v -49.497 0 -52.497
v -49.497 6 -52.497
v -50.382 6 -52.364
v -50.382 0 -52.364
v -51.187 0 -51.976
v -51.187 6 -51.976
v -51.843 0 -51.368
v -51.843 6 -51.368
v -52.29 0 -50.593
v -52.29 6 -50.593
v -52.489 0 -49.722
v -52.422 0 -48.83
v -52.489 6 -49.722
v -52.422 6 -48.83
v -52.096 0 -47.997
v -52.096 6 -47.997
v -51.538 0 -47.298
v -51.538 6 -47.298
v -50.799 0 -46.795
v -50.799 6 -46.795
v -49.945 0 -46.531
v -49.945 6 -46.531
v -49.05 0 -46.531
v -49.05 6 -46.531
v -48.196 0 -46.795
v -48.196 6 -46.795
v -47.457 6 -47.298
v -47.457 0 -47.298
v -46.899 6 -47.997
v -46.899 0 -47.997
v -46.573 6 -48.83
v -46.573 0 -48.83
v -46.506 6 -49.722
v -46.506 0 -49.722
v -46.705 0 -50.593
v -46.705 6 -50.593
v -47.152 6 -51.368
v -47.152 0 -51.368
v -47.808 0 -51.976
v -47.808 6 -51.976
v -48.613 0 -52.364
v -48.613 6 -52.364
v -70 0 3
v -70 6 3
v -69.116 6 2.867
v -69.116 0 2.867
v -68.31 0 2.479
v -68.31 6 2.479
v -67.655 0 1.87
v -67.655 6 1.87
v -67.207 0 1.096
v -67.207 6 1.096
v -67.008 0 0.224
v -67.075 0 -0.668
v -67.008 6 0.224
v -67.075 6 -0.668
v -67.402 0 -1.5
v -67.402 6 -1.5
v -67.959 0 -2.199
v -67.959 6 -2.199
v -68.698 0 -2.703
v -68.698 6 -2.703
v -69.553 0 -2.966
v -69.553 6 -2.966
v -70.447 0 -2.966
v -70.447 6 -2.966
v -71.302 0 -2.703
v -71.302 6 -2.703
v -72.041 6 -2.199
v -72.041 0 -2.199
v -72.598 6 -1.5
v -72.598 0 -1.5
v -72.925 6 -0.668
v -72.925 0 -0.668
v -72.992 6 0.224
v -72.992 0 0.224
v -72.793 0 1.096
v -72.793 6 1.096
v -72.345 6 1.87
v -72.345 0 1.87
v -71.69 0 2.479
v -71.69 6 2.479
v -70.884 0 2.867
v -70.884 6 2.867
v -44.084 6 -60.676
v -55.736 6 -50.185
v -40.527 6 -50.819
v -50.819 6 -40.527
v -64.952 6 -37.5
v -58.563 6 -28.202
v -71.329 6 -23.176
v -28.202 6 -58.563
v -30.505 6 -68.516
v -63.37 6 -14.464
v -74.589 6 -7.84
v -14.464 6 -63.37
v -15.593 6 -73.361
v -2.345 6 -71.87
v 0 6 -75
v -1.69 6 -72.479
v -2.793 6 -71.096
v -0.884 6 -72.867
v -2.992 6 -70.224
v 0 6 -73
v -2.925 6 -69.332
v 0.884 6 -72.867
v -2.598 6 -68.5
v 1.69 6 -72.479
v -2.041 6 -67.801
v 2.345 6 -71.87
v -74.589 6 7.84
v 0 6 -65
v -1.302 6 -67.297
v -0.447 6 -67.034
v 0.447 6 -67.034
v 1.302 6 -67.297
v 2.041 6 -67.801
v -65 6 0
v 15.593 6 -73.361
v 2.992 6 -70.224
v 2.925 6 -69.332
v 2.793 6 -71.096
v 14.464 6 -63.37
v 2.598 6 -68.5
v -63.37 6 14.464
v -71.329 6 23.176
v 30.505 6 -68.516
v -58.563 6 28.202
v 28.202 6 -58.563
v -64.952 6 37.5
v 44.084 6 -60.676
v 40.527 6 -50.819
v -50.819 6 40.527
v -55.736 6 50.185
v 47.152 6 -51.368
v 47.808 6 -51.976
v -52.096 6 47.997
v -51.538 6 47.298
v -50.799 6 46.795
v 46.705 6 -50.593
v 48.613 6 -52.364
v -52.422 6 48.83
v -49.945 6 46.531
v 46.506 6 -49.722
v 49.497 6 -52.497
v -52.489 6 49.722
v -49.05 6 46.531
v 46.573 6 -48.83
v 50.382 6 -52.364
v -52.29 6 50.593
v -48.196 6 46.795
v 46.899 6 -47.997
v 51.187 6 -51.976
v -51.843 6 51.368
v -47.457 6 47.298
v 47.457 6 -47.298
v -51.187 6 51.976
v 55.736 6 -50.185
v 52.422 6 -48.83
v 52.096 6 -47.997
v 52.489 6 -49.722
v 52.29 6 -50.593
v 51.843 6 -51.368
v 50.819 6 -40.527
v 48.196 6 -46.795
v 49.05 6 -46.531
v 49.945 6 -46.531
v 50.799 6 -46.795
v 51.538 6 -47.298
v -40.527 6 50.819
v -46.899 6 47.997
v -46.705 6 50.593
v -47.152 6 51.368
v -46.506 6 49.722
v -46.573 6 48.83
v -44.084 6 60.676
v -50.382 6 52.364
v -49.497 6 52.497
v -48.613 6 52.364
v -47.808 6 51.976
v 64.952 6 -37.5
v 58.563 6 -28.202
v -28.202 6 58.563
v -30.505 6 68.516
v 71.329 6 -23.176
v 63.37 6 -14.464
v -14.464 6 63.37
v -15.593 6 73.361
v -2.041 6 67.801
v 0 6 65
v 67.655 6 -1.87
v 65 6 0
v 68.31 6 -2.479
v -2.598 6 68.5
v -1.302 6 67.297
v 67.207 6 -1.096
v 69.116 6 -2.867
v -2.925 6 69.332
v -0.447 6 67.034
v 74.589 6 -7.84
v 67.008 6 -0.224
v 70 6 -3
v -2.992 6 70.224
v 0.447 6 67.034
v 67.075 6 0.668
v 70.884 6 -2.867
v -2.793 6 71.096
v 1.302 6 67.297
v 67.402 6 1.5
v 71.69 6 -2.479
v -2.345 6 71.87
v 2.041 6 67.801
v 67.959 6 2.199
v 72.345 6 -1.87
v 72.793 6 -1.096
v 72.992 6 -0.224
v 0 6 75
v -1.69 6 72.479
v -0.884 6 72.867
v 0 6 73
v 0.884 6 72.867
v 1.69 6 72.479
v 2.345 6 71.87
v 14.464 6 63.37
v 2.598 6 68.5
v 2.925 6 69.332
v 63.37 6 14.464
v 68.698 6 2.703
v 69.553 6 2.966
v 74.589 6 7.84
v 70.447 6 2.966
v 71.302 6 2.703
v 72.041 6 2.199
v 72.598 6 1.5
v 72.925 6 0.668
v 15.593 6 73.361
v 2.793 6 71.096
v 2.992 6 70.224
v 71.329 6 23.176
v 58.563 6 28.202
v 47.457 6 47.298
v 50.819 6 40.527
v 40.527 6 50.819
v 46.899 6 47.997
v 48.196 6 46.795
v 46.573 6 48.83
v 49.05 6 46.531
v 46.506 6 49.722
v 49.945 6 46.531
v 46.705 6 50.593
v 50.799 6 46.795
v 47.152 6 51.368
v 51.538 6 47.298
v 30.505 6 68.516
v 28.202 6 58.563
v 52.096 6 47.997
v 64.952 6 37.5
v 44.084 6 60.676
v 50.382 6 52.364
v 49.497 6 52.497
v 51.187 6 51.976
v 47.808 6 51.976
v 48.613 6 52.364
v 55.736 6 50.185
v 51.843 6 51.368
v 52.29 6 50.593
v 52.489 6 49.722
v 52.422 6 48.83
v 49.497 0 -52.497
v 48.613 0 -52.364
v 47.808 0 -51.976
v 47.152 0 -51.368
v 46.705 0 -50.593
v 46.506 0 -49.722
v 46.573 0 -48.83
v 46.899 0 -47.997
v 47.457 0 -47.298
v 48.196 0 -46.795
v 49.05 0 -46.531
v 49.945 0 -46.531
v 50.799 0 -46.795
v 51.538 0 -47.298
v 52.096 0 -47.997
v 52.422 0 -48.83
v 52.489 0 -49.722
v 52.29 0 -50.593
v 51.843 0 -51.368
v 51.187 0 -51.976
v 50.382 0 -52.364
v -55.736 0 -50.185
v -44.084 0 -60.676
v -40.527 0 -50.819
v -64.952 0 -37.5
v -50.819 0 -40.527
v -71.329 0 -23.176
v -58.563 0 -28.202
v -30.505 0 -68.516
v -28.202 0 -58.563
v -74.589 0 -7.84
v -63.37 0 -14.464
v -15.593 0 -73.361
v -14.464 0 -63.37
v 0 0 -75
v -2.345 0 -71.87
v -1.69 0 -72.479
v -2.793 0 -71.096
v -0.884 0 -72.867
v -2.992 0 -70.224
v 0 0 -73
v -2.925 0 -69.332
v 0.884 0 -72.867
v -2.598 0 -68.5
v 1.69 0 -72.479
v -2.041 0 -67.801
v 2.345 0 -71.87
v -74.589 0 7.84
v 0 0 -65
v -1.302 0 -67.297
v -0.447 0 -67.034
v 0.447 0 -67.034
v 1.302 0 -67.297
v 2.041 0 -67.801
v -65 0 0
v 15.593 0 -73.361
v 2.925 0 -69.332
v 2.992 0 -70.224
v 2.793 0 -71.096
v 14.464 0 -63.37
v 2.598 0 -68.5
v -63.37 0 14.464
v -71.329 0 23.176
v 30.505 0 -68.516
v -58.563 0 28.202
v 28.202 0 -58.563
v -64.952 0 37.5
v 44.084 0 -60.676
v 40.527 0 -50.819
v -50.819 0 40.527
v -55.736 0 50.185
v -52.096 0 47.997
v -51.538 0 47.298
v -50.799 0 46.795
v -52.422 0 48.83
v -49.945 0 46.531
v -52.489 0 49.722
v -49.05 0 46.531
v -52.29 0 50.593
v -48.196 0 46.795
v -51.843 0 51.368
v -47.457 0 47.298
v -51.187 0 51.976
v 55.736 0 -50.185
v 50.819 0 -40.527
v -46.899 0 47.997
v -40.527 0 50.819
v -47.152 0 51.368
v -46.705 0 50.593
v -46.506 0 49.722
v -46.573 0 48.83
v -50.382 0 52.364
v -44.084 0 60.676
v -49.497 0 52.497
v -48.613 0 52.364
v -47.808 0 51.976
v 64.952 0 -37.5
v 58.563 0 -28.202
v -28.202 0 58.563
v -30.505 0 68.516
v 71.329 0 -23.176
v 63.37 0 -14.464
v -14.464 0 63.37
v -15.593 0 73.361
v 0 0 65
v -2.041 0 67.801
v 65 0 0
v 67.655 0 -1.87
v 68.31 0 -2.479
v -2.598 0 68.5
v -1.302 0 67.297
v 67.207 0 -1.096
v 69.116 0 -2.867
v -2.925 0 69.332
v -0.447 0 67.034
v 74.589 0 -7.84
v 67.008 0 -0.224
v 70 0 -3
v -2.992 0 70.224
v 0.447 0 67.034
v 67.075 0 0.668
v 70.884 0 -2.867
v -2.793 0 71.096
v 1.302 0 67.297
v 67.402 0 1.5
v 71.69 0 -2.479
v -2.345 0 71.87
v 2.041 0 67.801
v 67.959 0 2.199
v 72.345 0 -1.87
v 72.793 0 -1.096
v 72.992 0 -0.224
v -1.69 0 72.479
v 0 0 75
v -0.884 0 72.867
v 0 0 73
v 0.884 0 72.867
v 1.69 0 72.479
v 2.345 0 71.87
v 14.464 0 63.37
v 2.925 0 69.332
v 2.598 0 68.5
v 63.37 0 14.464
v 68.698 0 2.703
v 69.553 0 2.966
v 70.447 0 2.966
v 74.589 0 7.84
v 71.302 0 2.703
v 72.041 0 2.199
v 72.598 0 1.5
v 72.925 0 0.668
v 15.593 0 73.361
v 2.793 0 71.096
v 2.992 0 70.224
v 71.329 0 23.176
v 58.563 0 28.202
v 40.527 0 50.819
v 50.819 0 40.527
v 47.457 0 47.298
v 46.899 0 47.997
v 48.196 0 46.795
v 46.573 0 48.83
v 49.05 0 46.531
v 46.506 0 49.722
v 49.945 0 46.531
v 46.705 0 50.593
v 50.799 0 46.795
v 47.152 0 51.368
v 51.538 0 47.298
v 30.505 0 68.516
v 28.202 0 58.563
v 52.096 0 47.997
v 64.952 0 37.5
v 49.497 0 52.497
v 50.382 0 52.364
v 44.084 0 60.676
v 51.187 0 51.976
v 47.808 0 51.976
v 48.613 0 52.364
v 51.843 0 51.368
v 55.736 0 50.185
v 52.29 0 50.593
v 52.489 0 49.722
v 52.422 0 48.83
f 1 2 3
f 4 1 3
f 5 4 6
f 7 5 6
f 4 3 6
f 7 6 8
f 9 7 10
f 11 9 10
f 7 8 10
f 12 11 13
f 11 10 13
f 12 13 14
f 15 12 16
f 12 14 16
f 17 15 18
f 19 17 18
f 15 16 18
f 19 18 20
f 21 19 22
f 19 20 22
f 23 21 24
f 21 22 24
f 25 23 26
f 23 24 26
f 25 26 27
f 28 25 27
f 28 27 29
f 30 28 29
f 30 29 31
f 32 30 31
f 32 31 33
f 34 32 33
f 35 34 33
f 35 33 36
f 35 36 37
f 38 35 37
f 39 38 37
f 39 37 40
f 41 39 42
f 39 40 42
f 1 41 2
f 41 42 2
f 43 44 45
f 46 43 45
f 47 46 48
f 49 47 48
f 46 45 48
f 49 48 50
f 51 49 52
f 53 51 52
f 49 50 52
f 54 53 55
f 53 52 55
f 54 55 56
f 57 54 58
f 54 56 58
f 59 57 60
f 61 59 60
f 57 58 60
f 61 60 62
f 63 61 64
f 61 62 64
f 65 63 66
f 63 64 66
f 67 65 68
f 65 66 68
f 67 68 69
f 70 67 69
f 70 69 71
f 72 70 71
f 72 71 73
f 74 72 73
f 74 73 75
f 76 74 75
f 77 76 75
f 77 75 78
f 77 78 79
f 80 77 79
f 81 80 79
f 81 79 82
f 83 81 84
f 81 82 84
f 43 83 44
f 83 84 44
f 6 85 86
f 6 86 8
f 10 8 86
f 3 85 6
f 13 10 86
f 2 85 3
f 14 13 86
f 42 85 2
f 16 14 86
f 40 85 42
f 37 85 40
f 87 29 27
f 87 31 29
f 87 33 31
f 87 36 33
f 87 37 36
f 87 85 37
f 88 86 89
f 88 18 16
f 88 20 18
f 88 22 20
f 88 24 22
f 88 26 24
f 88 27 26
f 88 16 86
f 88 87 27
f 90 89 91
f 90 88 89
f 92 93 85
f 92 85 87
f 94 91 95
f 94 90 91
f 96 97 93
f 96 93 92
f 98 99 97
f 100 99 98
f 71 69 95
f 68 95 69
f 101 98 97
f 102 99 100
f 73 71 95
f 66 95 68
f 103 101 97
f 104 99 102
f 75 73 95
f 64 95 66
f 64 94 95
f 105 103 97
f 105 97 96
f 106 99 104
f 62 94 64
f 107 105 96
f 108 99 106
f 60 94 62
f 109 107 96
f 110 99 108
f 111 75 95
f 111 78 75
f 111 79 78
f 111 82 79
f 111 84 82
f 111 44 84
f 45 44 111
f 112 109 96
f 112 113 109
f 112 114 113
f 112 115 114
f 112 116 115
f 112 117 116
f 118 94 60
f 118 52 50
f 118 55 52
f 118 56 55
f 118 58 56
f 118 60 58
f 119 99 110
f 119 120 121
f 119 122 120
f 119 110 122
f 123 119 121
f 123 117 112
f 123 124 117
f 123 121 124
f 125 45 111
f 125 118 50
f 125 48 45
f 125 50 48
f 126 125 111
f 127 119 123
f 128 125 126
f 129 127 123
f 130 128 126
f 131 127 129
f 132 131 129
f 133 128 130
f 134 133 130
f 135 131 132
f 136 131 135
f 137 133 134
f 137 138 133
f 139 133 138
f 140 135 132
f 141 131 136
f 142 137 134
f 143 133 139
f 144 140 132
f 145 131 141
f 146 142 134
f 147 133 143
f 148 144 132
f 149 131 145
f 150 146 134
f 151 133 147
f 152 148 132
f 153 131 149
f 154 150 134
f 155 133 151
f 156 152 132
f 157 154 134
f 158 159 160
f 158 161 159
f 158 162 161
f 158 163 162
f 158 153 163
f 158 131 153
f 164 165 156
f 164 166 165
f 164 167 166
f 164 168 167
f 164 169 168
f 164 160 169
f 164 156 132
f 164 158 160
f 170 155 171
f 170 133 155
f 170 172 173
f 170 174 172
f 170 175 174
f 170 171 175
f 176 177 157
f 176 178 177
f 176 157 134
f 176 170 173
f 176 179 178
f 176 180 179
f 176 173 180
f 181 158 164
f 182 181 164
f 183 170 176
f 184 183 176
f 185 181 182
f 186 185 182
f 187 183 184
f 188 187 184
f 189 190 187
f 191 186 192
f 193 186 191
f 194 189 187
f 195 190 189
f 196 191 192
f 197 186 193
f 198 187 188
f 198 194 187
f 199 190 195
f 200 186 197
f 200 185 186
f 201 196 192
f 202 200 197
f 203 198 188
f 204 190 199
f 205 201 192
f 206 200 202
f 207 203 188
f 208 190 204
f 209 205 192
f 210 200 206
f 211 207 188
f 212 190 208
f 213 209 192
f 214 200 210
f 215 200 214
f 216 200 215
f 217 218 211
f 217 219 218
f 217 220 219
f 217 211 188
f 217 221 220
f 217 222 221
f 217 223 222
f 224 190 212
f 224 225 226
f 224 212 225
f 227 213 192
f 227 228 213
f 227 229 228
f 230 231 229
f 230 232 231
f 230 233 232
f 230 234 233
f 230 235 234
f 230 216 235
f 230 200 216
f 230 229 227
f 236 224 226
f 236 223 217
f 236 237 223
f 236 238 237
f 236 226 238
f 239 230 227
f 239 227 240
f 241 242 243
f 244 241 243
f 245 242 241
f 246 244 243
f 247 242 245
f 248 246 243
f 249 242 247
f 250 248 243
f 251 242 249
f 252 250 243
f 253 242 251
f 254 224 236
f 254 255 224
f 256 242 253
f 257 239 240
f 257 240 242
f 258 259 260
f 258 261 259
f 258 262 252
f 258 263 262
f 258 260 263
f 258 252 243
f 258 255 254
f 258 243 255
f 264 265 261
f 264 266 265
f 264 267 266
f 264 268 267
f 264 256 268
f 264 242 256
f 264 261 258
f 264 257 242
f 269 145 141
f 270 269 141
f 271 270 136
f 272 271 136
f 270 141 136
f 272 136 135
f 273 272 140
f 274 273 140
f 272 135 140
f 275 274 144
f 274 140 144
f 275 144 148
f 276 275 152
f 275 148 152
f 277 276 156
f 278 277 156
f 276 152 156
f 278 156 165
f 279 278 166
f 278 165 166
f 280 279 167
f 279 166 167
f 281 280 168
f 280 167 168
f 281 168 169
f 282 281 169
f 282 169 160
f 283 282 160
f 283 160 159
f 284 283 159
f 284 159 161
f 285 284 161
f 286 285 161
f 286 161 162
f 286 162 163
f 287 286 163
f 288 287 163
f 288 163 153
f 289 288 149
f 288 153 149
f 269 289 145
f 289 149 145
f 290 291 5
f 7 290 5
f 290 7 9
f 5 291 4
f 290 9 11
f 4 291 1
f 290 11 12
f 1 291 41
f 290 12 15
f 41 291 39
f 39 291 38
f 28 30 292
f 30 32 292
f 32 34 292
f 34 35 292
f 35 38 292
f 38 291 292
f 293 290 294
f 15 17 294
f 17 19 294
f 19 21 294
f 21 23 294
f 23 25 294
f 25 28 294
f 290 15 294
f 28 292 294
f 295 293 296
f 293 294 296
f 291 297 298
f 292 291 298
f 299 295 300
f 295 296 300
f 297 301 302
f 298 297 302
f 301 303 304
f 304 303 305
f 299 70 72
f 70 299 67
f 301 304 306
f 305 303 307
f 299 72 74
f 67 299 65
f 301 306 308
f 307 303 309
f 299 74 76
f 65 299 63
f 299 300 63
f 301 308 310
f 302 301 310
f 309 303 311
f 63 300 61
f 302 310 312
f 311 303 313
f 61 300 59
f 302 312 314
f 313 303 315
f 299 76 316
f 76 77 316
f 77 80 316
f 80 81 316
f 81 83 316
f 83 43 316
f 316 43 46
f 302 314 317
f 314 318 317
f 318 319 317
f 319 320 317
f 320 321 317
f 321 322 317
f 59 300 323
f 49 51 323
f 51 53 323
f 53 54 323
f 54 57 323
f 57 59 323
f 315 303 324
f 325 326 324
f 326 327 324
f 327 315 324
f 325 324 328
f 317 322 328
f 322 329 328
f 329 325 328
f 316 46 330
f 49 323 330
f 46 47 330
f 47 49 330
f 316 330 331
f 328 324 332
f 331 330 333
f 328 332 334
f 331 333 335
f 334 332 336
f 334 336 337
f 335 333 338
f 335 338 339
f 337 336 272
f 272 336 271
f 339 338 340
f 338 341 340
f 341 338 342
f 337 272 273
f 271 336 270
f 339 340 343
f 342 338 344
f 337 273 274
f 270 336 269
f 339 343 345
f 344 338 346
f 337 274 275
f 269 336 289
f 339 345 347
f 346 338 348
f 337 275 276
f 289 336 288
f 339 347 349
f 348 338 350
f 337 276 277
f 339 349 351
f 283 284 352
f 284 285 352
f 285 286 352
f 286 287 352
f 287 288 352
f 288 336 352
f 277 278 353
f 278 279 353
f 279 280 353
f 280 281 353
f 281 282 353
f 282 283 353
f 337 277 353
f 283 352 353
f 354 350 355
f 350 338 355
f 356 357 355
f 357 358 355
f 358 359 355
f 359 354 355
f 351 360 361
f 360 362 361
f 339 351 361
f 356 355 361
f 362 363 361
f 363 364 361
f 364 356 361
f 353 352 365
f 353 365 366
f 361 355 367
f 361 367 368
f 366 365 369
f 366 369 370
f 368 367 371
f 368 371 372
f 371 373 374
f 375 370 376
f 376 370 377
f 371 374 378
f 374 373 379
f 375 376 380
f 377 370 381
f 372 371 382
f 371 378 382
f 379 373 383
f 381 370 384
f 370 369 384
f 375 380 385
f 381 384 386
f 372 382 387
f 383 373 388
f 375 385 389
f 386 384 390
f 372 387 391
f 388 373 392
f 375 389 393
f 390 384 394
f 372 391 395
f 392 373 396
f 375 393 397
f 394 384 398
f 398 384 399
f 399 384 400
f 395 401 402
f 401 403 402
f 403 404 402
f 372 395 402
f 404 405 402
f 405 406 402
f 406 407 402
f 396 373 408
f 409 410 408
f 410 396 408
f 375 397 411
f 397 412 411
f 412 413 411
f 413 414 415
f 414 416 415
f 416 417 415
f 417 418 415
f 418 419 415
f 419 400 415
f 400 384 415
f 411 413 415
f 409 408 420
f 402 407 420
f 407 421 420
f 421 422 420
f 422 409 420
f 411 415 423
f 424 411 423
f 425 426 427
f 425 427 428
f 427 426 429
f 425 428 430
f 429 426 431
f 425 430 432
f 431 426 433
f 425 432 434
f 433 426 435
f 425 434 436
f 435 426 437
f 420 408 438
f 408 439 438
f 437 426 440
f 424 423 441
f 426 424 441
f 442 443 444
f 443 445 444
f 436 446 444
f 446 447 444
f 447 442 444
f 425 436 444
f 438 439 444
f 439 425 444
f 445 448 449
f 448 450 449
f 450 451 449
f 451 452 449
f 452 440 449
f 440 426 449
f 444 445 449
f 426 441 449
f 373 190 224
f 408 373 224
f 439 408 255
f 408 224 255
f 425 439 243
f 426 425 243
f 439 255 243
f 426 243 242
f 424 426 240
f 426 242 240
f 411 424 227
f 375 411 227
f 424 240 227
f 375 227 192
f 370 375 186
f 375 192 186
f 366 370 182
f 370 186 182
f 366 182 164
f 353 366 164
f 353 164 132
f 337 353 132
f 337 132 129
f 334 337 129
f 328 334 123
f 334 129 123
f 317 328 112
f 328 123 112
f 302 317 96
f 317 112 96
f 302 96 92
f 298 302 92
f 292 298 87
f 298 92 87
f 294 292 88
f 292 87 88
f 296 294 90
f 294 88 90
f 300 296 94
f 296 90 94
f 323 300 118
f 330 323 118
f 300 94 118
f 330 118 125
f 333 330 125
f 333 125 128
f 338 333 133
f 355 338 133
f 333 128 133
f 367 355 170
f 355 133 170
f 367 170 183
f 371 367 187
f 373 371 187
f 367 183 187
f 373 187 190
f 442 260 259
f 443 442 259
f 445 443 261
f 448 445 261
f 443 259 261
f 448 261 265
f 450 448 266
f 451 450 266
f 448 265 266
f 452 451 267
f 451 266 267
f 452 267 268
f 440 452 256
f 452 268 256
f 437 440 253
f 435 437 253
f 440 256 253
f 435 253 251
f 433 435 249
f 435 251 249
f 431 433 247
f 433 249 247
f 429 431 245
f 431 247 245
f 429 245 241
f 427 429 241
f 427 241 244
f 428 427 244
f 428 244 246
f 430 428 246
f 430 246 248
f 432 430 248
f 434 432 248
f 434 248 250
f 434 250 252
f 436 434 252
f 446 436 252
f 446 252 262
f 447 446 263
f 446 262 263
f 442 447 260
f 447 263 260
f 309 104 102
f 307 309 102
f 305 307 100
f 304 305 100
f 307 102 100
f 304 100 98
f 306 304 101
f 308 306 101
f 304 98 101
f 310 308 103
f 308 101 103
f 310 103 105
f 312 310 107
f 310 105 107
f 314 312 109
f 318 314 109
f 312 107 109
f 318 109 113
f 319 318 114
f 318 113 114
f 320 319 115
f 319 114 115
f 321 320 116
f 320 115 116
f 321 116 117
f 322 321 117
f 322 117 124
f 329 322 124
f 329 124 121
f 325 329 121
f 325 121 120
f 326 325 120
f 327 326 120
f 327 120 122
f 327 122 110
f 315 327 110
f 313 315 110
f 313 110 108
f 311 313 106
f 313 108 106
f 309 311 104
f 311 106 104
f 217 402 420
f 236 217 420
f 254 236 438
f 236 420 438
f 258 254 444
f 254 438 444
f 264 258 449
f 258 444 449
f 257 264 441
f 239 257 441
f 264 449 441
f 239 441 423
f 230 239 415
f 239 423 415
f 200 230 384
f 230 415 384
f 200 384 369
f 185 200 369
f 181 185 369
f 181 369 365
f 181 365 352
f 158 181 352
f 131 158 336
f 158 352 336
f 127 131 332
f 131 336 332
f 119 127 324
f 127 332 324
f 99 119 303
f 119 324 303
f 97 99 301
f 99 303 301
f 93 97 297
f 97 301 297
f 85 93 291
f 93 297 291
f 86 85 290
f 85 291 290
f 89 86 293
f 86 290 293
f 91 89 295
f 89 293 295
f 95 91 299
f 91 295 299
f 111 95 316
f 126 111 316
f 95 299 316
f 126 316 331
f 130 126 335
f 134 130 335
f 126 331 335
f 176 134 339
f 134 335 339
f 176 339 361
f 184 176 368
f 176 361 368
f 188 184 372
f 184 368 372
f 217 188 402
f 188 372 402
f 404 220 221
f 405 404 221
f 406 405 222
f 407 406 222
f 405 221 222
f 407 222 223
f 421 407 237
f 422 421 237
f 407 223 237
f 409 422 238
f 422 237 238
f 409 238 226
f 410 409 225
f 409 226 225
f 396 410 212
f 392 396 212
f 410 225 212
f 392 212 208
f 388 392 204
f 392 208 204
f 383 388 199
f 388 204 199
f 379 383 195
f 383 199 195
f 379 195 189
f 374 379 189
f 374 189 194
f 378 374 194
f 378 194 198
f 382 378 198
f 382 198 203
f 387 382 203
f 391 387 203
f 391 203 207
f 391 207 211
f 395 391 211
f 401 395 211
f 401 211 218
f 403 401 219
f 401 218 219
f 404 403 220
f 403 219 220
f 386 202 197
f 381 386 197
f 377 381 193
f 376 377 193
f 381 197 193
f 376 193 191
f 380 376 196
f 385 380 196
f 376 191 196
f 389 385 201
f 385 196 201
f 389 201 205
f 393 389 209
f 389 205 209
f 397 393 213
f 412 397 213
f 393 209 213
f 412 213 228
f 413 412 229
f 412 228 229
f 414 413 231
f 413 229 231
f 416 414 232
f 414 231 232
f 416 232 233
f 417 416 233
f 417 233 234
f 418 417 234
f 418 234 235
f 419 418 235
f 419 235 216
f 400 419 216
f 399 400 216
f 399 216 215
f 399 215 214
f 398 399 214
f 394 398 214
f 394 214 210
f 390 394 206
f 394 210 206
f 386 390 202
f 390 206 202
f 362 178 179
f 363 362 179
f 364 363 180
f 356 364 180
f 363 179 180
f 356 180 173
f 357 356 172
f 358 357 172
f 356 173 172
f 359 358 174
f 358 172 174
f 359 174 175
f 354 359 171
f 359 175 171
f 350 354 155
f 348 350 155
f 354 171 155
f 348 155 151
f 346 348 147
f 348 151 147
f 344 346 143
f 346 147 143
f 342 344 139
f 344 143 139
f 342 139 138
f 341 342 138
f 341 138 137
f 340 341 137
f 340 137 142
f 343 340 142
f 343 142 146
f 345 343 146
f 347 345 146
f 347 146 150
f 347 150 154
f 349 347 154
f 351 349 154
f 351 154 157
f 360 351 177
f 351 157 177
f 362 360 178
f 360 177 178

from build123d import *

# Parameters (mm, degrees)
SKETCH_1_R          = 75
EXTRUDE_1_DEPTH     = 6
SKETCH_2_R          = 3
CUT_EXTRUDE_1_DEPTH = 6
SKETCH_3_R          = 65
CUT_EXTRUDE_2_DEPTH = 6


with BuildPart() as part:
    # Эскиз1 → Бобышка-Вытянуть1 (new body)
    with BuildSketch(Plane(origin=(0, 0, 0), x_dir=(1, 0, 0), z_dir=(0, 1, 0))):
        with Locations(Location((0, 0, 0), (0, 0, 270))):
            Circle(SKETCH_1_R)
    extrude(amount=EXTRUDE_1_DEPTH)

    # Эскиз2 → Вырез-Вытянуть1 (cut)
    with BuildSketch(Plane(origin=(0, 6, 0), x_dir=(1, 0, 0), z_dir=(0, 1, 0))):
        with Locations(Location((-70, 0, 0), (0, 0, 270))):
            Circle(SKETCH_2_R)
        with Locations(Location((70, 0, 0), (0, 0, 90))):
            Circle(SKETCH_2_R)
        with Locations(Location((0, -70, 0), (0, 0, 270))):
            Circle(SKETCH_2_R)
        with Locations(Location((0, 70, 0), (0, 0, 90))):
            Circle(SKETCH_2_R)
        with Locations(Location((-49.497474683, -49.497474683, 0), (0, 0, 270))):
            Circle(SKETCH_2_R)
        with Locations(Location((-49.497474683, 49.497474683, 0), (0, 0, 90))):
            Circle(SKETCH_2_R)
        with Locations(Location((49.497474683, -49.497474683, 0), (0, 0, 270))):
            Circle(SKETCH_2_R)
        with Locations(Location((49.497474683, 49.497474683, 0), (0, 0, 90))):
            Circle(SKETCH_2_R)
    extrude(amount=-CUT_EXTRUDE_1_DEPTH, mode=Mode.SUBTRACT)

    # Эскиз3 → Вырез-Вытянуть2 (cut)
    with BuildSketch(Plane(origin=(0, 6, 0), x_dir=(1, 0, 0), z_dir=(0, 1, 0))):
        with Locations(Location((0, 0, 0), (0, 0, 270))):
            Circle(SKETCH_3_R)
    extrude(amount=-CUT_EXTRUDE_2_DEPTH, mode=Mode.SUBTRACT)


solid = part.part
